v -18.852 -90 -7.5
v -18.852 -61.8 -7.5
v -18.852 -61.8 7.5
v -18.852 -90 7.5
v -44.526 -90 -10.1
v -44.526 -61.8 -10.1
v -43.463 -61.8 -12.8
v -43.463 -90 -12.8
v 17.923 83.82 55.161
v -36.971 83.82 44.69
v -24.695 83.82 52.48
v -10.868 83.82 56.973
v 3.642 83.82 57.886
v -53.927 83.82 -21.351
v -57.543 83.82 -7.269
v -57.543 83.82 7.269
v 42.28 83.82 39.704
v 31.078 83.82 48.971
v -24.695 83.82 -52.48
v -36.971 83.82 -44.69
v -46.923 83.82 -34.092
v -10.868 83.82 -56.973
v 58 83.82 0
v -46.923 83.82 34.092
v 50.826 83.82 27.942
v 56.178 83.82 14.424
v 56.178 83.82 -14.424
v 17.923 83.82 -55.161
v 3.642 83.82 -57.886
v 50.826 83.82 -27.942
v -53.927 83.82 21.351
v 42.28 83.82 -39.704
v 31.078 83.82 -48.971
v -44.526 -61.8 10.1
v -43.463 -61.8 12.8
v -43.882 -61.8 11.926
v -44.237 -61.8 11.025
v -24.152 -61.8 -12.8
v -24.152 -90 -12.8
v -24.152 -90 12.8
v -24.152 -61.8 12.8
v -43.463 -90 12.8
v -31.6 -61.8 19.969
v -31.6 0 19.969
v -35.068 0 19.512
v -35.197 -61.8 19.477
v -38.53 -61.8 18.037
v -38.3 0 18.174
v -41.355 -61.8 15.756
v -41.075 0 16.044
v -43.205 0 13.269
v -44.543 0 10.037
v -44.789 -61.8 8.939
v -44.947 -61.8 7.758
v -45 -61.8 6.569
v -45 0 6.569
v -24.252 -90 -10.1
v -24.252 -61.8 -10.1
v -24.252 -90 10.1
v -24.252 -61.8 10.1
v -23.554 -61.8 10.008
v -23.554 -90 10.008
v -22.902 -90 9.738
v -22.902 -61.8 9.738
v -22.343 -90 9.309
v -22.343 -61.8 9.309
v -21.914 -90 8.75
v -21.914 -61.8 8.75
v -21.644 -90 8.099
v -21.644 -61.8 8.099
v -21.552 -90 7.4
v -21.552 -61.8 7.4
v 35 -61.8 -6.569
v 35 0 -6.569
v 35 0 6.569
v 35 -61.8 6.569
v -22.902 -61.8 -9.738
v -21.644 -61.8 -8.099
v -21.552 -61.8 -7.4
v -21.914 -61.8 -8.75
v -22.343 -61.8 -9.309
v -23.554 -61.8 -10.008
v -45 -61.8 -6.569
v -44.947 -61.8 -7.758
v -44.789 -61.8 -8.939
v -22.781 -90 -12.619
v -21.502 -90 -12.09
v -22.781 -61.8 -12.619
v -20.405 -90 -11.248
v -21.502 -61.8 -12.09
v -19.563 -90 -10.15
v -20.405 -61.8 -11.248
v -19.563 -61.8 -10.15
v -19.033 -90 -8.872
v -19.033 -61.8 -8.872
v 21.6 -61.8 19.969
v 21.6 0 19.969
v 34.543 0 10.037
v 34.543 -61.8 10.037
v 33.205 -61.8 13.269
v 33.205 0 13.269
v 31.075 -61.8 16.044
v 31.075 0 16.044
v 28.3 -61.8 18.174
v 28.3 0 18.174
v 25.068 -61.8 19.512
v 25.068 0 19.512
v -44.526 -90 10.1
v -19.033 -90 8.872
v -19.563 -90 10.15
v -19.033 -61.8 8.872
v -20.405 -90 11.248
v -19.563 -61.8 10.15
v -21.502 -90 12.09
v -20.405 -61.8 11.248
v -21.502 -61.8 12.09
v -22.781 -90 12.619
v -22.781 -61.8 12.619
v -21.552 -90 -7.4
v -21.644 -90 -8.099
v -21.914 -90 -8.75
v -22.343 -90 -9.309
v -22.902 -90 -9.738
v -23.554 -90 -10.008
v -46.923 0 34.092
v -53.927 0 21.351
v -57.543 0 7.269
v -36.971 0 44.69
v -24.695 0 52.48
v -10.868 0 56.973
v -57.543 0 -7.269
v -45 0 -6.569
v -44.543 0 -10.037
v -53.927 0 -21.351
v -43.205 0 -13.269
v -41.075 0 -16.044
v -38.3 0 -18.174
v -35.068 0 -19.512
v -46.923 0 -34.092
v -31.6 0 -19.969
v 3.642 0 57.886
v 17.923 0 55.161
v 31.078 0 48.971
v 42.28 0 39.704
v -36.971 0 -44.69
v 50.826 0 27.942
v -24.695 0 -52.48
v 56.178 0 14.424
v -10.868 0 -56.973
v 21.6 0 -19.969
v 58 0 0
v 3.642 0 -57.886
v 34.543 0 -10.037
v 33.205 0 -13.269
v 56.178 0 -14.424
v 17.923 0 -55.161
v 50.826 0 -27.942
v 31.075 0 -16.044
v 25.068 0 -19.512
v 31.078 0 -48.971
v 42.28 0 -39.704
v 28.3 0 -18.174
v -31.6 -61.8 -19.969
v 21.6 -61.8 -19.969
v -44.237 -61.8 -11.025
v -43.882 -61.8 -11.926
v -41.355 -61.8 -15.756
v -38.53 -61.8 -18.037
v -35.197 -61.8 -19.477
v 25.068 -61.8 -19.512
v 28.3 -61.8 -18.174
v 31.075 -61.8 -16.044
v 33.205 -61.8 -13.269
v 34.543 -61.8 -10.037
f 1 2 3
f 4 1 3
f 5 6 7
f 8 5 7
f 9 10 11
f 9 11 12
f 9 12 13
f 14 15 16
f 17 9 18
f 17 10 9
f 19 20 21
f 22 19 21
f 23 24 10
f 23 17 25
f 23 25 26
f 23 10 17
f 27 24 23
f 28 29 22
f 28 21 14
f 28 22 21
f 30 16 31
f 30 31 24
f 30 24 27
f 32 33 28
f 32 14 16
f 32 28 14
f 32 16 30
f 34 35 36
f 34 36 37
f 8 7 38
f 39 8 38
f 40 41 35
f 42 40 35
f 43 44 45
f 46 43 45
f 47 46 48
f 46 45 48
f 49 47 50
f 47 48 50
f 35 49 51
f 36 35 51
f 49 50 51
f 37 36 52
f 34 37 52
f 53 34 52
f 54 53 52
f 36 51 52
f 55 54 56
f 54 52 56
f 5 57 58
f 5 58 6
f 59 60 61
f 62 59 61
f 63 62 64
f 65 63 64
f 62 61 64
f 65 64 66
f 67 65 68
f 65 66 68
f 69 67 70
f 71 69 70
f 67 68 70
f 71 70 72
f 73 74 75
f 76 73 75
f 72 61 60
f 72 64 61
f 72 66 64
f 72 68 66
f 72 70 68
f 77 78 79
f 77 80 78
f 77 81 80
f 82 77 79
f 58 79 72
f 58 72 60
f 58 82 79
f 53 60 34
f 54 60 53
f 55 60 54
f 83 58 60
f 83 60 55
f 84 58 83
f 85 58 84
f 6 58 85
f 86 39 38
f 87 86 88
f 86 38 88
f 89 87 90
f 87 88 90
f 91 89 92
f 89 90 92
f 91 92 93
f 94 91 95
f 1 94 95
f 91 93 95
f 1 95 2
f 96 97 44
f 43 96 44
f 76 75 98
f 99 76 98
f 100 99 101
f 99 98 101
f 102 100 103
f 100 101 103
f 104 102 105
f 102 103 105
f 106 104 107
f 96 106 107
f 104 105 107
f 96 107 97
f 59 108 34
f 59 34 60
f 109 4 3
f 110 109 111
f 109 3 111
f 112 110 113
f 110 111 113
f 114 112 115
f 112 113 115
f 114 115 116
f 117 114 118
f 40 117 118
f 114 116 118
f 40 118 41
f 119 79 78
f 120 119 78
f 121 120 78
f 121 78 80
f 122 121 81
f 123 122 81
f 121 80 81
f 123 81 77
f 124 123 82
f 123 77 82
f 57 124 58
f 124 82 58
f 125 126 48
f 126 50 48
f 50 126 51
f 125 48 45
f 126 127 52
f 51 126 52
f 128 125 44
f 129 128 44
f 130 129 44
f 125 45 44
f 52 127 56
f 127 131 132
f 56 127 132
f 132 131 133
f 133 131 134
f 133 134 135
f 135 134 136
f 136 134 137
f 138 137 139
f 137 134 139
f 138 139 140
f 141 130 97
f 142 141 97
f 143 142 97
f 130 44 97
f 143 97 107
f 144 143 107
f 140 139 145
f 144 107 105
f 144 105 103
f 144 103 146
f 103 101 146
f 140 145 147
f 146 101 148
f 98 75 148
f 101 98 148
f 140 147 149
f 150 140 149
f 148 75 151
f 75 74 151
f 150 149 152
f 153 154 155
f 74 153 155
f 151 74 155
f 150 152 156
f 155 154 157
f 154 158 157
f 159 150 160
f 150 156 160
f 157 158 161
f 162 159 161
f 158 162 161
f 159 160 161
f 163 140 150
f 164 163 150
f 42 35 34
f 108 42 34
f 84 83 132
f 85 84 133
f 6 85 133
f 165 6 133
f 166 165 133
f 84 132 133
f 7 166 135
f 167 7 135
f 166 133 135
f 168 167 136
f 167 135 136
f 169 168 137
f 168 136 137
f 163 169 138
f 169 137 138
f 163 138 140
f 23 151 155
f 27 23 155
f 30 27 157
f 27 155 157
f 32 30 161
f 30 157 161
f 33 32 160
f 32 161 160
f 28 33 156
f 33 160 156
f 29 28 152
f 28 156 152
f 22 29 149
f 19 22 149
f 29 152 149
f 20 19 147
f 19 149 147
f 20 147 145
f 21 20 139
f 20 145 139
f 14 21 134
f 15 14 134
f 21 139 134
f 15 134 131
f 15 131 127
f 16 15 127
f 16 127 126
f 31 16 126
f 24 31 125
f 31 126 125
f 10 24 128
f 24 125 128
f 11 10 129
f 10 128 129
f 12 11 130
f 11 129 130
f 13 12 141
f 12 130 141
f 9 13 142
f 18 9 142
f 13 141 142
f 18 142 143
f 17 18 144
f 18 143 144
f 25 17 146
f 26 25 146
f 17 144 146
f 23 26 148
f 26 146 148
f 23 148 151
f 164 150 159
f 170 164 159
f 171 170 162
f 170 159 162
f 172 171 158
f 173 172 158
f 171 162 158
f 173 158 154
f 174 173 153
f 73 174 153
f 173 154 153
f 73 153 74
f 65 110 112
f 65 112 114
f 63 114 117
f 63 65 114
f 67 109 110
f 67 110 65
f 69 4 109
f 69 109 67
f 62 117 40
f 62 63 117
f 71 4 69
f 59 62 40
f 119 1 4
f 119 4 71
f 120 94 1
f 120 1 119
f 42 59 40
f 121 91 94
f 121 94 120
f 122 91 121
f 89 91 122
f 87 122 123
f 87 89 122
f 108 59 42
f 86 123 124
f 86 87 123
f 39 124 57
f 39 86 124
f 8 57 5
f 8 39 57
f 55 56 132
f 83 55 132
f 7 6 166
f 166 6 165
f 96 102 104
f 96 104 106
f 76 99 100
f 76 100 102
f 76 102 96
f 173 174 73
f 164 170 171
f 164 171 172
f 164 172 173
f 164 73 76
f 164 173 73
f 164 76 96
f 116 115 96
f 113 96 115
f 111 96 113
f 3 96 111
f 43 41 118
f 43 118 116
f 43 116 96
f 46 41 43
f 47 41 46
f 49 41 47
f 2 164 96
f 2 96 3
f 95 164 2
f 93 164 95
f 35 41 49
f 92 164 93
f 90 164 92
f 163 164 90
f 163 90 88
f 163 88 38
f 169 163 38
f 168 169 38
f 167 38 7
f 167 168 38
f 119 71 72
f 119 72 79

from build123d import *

# Parameters (mm, degrees)
SKETCH1_R           = 58
BOSS_EXTRUDE1_DEPTH = 83.82
BOSS_EXTRUDE2_DEPTH = 61.8
BOSS_EXTRUDE3_DEPTH = 90


with BuildPart() as part:
    # Sketch1 → Boss-Extrude1 (new body)
    with BuildSketch(Plane(origin=(0, 0, 0), x_dir=(1, 0, 0), z_dir=(0, 1, 0))):
        Circle(SKETCH1_R)
    extrude(amount=BOSS_EXTRUDE1_DEPTH)

    # Sketch2 → Boss-Extrude2 (add)
    with BuildSketch(Plane(origin=(0, 0, 0), x_dir=(1, 0, 0), z_dir=(0, 1, 0))):
        with BuildLine():
            Line((-45, -6.568854261), (-45, 6.568854261))
            ThreePointArc((-45, 6.568854261), (-41.075230868, 16.044085129), (-31.6, 19.968854261))
            Line((-31.6, 19.968854261), (21.6, 19.968854261))
            ThreePointArc((21.6, 19.968854261), (31.075230868, 16.044085129), (35, 6.568854261))
            Line((35, 6.568854261), (35, -6.568854261))
            ThreePointArc((35, -6.568854261), (31.075230868, -16.044085129), (21.6, -19.968854261))
            Line((21.6, -19.968854261), (-31.6, -19.968854261))
            ThreePointArc((-31.6, -19.968854261), (-41.075230868, -16.044085129), (-45, -6.568854261))
        make_face()
    extrude(amount=-BOSS_EXTRUDE2_DEPTH)

    # Sketch3 → Boss-Extrude3 (add)
    with BuildSketch(Plane(origin=(0, 0, 0), x_dir=(1, 0, 0), z_dir=(0, 1, 0))):
        with BuildLine():
            Line((-21.552493426, -4.8), (-21.552493426, 4.8))
            Line((-21.552493426, 4.8), (-21.552493426, 7.4))
            ThreePointArc((-21.552493426, 7.4), (-22.343305117, 9.309188309), (-24.252493426, 10.1))
            Line((-24.252493426, 10.1), (-26.852493426, 10.1))
            Line((-26.852493426, 10.1), (-44.526368777, 10.1))
            Line((-44.526368777, 10.1), (-43.463086562, 12.8))
            Line((-43.463086562, 12.8), (-24.152493426, 12.8))
            ThreePointArc((-24.152493426, 12.8), (-20.404827486, 11.24766594), (-18.852493426, 7.5))
            Line((-18.852493426, 7.5), (-18.852493426, -7.5))
            ThreePointArc((-18.852493426, -7.5), (-20.404827486, -11.24766594), (-24.152493426, -12.8))
            Line((-24.152493426, -12.8), (-40.189232196, -12.8))
            Line((-40.189232196, -12.8), (-43.463086562, -12.8))
            Line((-43.463086562, -12.8), (-44.526368777, -10.1))
            Line((-44.526368777, -10.1), (-26.852493426, -10.1))
            Line((-26.852493426, -10.1), (-24.252493426, -10.1))
            ThreePointArc((-24.252493426, -10.1), (-22.343305117, -9.309188309), (-21.552493426, -7.4))
            Line((-21.552493426, -7.4), (-21.552493426, -4.8))
        make_face()
    extrude(amount=-BOSS_EXTRUDE3_DEPTH)


solid = part.part
